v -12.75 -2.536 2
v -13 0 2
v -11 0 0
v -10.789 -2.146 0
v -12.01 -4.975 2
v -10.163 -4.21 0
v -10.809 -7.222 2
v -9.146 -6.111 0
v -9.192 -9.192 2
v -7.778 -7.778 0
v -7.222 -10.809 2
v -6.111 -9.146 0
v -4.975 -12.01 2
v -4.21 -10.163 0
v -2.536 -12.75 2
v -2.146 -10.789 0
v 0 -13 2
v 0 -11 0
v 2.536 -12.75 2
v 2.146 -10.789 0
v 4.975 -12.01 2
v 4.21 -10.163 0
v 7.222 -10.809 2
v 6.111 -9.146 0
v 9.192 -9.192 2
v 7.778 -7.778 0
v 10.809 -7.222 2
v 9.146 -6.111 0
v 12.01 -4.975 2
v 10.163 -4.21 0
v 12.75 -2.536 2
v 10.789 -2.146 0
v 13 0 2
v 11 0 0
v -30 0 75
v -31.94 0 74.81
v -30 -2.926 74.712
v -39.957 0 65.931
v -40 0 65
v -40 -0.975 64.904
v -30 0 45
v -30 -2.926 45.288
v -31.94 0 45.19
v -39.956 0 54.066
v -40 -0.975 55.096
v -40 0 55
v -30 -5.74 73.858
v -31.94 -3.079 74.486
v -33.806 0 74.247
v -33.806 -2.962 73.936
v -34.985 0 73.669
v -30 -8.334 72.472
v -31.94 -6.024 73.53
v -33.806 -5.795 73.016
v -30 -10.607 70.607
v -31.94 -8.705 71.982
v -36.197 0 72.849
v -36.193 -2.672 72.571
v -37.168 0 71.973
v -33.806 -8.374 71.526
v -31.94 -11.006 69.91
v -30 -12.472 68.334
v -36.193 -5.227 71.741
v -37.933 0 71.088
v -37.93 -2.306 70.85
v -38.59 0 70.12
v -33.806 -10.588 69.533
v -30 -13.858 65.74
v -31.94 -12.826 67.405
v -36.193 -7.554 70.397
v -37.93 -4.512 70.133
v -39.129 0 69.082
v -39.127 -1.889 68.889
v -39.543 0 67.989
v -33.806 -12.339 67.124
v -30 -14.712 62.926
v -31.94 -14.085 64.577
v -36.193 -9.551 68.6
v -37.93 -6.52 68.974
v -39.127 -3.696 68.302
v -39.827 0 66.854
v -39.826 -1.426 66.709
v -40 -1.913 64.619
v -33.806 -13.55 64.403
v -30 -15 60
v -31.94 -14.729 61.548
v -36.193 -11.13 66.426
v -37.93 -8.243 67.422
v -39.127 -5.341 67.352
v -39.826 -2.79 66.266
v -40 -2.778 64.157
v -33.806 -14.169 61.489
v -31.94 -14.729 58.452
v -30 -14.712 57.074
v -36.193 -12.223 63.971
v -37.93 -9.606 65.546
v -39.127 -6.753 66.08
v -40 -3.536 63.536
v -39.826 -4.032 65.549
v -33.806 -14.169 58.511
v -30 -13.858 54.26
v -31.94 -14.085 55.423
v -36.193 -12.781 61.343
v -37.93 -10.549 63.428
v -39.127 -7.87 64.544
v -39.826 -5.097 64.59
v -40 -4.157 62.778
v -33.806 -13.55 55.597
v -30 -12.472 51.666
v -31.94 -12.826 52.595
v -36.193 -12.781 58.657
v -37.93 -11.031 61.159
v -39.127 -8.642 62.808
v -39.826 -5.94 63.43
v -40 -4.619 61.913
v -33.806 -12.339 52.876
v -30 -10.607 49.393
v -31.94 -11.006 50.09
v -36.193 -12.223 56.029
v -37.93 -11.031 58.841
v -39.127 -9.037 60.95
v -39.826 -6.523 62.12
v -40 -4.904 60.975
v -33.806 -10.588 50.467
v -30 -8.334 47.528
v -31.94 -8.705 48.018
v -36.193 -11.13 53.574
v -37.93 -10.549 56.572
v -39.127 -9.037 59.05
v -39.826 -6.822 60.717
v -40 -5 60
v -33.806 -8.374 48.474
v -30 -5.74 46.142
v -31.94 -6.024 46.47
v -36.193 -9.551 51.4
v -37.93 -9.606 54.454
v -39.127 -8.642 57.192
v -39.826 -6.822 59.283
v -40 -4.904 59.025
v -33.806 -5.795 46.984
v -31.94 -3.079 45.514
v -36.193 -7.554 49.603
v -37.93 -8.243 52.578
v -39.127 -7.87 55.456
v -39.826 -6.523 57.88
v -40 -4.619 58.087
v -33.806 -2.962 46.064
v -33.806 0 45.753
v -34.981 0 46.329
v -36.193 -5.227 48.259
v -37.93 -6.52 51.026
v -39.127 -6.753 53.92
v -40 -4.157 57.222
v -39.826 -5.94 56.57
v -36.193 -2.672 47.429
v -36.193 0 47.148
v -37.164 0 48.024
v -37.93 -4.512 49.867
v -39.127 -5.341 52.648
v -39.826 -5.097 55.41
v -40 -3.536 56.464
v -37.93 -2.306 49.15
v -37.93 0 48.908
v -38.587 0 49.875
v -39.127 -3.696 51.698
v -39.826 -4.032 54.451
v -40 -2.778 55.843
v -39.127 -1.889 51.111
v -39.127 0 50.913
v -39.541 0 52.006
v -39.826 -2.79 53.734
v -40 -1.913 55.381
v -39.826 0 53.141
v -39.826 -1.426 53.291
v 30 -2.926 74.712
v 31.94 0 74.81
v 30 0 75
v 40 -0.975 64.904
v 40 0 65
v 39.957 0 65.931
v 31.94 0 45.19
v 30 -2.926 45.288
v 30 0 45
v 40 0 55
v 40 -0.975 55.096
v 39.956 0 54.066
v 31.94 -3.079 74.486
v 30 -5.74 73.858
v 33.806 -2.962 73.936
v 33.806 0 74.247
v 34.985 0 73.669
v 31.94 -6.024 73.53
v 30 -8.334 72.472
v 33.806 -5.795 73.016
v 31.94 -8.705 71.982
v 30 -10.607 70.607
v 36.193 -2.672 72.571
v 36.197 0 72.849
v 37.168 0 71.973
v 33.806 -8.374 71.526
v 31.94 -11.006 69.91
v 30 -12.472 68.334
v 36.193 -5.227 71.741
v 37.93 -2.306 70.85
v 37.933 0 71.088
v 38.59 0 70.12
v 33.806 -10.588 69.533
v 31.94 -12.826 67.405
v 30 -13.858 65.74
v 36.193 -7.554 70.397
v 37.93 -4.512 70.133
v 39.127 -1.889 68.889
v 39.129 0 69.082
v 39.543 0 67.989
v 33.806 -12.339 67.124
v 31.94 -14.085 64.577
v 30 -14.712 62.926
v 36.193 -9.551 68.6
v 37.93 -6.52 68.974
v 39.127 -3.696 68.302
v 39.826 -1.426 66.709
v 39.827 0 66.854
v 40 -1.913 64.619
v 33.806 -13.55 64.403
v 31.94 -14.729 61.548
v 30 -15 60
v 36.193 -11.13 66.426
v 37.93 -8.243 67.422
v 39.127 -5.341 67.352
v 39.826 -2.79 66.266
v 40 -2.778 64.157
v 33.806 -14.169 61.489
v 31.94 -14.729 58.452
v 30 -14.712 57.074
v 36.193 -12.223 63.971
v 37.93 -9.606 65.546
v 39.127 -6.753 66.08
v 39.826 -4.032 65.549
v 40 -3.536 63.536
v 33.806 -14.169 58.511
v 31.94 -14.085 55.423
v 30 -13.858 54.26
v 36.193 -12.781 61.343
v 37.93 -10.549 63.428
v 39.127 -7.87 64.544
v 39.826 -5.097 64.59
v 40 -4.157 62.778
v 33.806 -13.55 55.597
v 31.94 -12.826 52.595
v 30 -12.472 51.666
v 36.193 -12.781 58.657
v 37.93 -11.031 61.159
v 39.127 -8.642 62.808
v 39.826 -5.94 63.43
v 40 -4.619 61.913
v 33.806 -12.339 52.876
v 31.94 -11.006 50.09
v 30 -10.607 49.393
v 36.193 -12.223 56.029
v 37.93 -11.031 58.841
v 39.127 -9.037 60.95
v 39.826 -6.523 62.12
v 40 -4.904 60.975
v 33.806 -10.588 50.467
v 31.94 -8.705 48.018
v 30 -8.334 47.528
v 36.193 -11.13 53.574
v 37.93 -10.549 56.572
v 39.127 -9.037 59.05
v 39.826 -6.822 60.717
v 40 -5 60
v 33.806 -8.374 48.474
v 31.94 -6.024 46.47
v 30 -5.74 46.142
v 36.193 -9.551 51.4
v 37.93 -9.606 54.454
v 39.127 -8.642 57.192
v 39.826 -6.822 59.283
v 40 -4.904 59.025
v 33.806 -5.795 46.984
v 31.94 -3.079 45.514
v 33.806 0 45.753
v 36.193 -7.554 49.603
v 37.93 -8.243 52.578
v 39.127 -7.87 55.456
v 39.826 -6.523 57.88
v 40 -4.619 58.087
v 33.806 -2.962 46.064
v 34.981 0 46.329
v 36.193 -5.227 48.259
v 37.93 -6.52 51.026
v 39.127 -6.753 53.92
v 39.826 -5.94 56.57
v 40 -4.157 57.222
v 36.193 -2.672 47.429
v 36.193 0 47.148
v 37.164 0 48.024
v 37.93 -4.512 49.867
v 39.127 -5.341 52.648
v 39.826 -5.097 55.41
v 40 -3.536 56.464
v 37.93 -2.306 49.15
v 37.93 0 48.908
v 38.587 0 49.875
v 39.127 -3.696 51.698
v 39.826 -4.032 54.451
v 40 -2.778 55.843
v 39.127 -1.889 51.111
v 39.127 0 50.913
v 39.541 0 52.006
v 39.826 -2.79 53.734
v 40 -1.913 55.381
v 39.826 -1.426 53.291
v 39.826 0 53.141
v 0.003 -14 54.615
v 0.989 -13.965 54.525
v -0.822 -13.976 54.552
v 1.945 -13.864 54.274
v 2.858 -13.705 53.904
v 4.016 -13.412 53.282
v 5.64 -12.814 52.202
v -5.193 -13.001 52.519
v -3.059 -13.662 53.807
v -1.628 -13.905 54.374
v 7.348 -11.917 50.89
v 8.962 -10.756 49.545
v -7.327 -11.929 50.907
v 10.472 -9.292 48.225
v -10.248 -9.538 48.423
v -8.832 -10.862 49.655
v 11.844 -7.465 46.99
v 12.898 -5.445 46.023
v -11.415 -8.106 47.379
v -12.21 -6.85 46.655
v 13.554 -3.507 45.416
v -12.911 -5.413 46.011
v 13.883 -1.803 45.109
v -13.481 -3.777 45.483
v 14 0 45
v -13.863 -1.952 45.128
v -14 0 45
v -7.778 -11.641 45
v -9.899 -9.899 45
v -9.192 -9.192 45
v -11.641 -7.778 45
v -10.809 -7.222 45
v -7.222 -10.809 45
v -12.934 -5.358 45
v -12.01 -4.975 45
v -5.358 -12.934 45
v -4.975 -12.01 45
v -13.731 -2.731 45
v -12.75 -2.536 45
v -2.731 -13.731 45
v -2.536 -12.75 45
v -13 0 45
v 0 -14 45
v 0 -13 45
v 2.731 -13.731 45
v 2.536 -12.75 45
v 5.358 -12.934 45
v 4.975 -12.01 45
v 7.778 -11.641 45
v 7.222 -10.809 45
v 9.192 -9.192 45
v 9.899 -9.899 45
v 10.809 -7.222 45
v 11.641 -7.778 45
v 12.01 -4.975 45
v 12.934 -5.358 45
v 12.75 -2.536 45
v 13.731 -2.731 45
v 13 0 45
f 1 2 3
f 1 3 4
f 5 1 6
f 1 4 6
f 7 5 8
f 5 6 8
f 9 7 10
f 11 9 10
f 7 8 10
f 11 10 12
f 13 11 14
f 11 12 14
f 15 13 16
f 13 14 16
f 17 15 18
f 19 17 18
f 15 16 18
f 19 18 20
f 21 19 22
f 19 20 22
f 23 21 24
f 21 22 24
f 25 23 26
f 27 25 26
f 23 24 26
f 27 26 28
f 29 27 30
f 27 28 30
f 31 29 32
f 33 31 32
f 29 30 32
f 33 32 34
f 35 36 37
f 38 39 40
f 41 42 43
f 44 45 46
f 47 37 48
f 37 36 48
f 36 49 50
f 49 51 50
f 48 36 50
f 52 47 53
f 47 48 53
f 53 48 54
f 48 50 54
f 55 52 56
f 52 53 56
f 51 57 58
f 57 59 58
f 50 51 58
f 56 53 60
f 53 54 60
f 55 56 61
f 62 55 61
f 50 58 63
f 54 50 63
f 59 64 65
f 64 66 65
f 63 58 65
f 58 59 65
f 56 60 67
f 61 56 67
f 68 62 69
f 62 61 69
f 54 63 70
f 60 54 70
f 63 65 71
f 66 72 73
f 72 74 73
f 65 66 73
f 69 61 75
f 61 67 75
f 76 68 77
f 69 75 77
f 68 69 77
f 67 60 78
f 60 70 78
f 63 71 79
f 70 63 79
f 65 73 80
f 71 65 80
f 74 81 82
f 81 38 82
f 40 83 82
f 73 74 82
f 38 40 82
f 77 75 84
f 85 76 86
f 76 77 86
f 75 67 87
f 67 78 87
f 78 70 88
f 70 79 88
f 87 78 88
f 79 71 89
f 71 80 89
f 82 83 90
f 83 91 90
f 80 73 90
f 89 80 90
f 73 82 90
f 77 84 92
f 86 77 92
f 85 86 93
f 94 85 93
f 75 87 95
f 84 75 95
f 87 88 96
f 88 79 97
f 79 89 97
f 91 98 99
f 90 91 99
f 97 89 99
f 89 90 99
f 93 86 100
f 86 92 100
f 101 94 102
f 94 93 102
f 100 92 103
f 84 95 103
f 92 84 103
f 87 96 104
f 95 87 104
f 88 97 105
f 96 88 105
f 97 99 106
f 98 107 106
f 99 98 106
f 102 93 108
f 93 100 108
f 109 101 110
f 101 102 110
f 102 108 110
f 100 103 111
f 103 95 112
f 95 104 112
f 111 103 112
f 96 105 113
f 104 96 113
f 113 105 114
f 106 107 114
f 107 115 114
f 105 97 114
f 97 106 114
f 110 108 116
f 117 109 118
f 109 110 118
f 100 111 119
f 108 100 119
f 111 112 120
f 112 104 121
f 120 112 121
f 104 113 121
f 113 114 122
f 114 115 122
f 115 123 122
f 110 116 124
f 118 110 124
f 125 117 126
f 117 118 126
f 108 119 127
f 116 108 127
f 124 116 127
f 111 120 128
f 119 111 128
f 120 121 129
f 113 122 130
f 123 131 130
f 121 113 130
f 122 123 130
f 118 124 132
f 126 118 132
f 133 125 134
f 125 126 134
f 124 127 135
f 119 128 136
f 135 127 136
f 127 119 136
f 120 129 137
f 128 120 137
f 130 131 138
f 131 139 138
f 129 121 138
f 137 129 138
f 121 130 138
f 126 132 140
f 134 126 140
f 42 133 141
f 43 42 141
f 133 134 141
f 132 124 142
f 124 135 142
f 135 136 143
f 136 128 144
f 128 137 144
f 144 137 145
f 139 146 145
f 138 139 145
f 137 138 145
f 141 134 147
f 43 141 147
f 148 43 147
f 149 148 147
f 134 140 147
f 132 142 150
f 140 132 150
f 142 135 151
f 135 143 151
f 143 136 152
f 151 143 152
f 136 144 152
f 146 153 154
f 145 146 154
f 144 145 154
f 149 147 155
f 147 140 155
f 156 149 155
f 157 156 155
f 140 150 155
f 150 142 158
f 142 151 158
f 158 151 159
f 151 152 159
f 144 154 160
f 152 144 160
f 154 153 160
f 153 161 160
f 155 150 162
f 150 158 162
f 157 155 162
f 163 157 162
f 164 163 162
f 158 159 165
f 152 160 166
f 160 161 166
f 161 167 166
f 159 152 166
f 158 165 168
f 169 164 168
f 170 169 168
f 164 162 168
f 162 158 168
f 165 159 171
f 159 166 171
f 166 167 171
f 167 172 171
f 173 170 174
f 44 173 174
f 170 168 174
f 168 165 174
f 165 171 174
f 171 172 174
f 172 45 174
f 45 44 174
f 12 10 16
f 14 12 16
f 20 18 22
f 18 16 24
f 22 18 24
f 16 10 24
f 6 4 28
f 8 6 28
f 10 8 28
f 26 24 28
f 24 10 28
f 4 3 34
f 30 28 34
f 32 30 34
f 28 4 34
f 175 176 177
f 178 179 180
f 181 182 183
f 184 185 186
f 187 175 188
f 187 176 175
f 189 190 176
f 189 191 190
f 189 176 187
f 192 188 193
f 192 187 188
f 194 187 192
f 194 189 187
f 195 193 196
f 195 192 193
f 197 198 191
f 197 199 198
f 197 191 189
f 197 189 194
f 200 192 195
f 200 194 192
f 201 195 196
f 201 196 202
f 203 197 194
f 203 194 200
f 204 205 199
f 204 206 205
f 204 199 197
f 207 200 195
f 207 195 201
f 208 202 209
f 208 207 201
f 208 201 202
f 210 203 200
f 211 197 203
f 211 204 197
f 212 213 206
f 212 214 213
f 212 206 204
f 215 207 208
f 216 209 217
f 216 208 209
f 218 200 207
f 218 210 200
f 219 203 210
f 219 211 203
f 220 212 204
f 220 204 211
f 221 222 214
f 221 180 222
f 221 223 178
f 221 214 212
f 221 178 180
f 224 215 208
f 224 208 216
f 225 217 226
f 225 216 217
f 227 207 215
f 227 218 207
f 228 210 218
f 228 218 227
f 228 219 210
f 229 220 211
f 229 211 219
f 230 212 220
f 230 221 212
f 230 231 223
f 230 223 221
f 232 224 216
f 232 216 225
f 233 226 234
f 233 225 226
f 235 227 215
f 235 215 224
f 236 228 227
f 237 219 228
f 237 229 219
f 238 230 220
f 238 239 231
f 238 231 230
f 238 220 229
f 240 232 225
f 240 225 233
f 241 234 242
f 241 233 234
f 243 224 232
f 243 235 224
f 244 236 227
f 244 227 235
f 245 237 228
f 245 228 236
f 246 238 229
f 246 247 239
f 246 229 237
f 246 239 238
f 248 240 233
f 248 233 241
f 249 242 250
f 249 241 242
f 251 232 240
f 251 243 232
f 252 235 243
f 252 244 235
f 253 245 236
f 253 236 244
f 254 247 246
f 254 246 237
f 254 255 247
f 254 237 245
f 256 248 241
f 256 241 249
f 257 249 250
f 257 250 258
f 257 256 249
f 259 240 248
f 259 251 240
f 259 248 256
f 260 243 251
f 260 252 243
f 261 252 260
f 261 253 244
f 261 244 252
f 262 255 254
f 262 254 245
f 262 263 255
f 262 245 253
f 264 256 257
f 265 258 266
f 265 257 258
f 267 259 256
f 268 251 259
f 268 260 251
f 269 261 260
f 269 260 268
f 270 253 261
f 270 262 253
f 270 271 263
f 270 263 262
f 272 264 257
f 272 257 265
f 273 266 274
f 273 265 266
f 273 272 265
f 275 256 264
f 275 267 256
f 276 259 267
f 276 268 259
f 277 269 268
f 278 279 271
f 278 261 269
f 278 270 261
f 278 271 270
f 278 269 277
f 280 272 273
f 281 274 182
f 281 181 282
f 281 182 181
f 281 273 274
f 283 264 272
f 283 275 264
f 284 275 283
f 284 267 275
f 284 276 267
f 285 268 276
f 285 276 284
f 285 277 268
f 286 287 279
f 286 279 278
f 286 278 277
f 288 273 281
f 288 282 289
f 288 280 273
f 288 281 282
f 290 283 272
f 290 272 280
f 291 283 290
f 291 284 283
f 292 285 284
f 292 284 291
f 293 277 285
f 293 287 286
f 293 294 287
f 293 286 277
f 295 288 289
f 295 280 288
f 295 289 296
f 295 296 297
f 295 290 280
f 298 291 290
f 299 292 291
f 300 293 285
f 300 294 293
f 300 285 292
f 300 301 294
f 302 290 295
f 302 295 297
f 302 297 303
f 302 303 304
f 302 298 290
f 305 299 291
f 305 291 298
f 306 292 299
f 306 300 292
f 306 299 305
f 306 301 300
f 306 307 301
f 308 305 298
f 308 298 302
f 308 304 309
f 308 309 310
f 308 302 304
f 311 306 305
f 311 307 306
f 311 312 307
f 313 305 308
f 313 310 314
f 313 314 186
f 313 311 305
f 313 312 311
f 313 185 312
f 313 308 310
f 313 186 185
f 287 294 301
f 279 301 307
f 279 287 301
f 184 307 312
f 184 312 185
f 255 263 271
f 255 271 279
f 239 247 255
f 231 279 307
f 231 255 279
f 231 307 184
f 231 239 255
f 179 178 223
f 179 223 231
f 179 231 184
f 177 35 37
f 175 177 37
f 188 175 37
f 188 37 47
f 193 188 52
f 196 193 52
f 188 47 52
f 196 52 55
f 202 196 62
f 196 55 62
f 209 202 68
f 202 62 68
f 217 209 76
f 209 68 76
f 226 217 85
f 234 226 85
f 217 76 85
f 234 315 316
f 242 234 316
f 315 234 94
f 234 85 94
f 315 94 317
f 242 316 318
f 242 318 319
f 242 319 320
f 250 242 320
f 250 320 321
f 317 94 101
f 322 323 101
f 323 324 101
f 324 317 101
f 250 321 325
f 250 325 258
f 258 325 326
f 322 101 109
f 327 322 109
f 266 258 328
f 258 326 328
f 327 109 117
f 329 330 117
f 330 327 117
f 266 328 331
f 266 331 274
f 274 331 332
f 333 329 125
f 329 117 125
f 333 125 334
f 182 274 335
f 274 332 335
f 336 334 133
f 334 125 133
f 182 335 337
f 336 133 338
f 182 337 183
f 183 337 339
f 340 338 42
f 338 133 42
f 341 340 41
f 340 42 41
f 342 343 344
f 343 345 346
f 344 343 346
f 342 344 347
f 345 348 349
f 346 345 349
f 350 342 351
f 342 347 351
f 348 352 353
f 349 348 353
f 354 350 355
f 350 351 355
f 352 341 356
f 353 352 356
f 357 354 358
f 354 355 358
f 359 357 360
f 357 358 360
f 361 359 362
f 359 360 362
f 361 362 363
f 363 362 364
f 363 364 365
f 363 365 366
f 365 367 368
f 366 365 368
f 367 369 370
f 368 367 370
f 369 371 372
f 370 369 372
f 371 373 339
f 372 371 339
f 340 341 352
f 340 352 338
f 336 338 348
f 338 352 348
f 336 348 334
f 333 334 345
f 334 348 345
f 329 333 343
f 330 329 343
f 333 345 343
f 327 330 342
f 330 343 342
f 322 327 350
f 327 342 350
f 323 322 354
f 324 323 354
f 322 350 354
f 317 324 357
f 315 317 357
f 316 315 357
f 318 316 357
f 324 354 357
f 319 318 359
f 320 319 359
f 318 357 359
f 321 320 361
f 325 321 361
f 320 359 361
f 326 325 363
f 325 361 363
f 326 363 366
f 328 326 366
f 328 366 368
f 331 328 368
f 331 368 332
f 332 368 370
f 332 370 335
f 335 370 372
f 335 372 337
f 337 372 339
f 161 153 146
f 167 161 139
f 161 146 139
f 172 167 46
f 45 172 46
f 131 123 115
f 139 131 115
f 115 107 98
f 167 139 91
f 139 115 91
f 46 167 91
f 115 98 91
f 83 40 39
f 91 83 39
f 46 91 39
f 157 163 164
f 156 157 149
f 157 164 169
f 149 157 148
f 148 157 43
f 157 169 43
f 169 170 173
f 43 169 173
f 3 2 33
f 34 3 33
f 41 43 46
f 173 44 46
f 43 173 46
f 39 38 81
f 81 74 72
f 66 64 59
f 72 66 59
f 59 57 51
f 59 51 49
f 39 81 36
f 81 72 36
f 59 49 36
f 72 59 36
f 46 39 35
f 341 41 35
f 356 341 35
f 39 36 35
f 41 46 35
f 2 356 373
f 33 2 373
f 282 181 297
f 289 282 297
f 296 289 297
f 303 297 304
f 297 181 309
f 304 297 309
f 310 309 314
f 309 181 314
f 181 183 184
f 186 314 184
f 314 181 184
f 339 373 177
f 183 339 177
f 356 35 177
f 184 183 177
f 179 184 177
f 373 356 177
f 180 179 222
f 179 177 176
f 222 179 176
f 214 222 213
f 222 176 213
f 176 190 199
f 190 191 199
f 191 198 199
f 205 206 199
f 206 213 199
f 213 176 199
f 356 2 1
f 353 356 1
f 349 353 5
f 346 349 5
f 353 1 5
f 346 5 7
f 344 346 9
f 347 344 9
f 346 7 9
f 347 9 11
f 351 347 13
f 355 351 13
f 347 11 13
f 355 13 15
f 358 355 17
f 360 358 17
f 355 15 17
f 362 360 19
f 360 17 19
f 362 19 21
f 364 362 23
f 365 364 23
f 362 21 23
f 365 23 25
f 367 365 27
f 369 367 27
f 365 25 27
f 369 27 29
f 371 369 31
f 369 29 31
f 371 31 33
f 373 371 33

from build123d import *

# Parameters (mm, degrees)
CYLINDER_R        = 13
CYLINDER_DEPTH    = 45
CYLINDER001_R     = 14
CYLINDER001_DEPTH = 10
CYLINDER002_R     = 15
CYLINDER002_DEPTH = 80
CHAMFER_SIZE      = 2
FILLET_R          = 10
BOX_W             = 80
BOX_H             = 80
BOX_DEPTH         = 15


with BuildPart() as part:
    # Cylinder → Cylinder (join)
    with BuildSketch(Plane.XY):
        Circle(CYLINDER_R)
    extrude(amount=CYLINDER_DEPTH)

    # Cylinder001 → Cylinder001 (join)
    with BuildSketch(Plane.XY.offset(45)):
        Circle(CYLINDER001_R)
    extrude(amount=CYLINDER001_DEPTH)

    # Cylinder002 → Cylinder002 (join)
    with BuildSketch(Plane(origin=(-40, 0, 60), x_dir=(0, 1, 0), z_dir=(1, 0, 0))):
        Circle(CYLINDER002_R)
    extrude(amount=CYLINDER002_DEPTH)

    # Chamfer
    chamfer_edges = [part.edges().sort_by_distance(p)[0] for p in [
        (-13, 0, 0),
    ]]
    chamfer(chamfer_edges, length=CHAMFER_SIZE)

    # Fillet
    fillet_edges = [part.edges().sort_by_distance(p)[0] for p in [
        (40, -15, 60),
        (-40, -15, 60),
    ]]
    fillet(fillet_edges, radius=FILLET_R)

    # Box → Box (cut)
    with BuildSketch(Plane(origin=(-40, 15, 0), x_dir=(1, 0, 0), z_dir=(0, -1, 0))):
        with Locations((40, 40)):
            Rectangle(BOX_W, BOX_H)
    extrude(amount=BOX_DEPTH, mode=Mode.SUBTRACT)


solid = part.part
